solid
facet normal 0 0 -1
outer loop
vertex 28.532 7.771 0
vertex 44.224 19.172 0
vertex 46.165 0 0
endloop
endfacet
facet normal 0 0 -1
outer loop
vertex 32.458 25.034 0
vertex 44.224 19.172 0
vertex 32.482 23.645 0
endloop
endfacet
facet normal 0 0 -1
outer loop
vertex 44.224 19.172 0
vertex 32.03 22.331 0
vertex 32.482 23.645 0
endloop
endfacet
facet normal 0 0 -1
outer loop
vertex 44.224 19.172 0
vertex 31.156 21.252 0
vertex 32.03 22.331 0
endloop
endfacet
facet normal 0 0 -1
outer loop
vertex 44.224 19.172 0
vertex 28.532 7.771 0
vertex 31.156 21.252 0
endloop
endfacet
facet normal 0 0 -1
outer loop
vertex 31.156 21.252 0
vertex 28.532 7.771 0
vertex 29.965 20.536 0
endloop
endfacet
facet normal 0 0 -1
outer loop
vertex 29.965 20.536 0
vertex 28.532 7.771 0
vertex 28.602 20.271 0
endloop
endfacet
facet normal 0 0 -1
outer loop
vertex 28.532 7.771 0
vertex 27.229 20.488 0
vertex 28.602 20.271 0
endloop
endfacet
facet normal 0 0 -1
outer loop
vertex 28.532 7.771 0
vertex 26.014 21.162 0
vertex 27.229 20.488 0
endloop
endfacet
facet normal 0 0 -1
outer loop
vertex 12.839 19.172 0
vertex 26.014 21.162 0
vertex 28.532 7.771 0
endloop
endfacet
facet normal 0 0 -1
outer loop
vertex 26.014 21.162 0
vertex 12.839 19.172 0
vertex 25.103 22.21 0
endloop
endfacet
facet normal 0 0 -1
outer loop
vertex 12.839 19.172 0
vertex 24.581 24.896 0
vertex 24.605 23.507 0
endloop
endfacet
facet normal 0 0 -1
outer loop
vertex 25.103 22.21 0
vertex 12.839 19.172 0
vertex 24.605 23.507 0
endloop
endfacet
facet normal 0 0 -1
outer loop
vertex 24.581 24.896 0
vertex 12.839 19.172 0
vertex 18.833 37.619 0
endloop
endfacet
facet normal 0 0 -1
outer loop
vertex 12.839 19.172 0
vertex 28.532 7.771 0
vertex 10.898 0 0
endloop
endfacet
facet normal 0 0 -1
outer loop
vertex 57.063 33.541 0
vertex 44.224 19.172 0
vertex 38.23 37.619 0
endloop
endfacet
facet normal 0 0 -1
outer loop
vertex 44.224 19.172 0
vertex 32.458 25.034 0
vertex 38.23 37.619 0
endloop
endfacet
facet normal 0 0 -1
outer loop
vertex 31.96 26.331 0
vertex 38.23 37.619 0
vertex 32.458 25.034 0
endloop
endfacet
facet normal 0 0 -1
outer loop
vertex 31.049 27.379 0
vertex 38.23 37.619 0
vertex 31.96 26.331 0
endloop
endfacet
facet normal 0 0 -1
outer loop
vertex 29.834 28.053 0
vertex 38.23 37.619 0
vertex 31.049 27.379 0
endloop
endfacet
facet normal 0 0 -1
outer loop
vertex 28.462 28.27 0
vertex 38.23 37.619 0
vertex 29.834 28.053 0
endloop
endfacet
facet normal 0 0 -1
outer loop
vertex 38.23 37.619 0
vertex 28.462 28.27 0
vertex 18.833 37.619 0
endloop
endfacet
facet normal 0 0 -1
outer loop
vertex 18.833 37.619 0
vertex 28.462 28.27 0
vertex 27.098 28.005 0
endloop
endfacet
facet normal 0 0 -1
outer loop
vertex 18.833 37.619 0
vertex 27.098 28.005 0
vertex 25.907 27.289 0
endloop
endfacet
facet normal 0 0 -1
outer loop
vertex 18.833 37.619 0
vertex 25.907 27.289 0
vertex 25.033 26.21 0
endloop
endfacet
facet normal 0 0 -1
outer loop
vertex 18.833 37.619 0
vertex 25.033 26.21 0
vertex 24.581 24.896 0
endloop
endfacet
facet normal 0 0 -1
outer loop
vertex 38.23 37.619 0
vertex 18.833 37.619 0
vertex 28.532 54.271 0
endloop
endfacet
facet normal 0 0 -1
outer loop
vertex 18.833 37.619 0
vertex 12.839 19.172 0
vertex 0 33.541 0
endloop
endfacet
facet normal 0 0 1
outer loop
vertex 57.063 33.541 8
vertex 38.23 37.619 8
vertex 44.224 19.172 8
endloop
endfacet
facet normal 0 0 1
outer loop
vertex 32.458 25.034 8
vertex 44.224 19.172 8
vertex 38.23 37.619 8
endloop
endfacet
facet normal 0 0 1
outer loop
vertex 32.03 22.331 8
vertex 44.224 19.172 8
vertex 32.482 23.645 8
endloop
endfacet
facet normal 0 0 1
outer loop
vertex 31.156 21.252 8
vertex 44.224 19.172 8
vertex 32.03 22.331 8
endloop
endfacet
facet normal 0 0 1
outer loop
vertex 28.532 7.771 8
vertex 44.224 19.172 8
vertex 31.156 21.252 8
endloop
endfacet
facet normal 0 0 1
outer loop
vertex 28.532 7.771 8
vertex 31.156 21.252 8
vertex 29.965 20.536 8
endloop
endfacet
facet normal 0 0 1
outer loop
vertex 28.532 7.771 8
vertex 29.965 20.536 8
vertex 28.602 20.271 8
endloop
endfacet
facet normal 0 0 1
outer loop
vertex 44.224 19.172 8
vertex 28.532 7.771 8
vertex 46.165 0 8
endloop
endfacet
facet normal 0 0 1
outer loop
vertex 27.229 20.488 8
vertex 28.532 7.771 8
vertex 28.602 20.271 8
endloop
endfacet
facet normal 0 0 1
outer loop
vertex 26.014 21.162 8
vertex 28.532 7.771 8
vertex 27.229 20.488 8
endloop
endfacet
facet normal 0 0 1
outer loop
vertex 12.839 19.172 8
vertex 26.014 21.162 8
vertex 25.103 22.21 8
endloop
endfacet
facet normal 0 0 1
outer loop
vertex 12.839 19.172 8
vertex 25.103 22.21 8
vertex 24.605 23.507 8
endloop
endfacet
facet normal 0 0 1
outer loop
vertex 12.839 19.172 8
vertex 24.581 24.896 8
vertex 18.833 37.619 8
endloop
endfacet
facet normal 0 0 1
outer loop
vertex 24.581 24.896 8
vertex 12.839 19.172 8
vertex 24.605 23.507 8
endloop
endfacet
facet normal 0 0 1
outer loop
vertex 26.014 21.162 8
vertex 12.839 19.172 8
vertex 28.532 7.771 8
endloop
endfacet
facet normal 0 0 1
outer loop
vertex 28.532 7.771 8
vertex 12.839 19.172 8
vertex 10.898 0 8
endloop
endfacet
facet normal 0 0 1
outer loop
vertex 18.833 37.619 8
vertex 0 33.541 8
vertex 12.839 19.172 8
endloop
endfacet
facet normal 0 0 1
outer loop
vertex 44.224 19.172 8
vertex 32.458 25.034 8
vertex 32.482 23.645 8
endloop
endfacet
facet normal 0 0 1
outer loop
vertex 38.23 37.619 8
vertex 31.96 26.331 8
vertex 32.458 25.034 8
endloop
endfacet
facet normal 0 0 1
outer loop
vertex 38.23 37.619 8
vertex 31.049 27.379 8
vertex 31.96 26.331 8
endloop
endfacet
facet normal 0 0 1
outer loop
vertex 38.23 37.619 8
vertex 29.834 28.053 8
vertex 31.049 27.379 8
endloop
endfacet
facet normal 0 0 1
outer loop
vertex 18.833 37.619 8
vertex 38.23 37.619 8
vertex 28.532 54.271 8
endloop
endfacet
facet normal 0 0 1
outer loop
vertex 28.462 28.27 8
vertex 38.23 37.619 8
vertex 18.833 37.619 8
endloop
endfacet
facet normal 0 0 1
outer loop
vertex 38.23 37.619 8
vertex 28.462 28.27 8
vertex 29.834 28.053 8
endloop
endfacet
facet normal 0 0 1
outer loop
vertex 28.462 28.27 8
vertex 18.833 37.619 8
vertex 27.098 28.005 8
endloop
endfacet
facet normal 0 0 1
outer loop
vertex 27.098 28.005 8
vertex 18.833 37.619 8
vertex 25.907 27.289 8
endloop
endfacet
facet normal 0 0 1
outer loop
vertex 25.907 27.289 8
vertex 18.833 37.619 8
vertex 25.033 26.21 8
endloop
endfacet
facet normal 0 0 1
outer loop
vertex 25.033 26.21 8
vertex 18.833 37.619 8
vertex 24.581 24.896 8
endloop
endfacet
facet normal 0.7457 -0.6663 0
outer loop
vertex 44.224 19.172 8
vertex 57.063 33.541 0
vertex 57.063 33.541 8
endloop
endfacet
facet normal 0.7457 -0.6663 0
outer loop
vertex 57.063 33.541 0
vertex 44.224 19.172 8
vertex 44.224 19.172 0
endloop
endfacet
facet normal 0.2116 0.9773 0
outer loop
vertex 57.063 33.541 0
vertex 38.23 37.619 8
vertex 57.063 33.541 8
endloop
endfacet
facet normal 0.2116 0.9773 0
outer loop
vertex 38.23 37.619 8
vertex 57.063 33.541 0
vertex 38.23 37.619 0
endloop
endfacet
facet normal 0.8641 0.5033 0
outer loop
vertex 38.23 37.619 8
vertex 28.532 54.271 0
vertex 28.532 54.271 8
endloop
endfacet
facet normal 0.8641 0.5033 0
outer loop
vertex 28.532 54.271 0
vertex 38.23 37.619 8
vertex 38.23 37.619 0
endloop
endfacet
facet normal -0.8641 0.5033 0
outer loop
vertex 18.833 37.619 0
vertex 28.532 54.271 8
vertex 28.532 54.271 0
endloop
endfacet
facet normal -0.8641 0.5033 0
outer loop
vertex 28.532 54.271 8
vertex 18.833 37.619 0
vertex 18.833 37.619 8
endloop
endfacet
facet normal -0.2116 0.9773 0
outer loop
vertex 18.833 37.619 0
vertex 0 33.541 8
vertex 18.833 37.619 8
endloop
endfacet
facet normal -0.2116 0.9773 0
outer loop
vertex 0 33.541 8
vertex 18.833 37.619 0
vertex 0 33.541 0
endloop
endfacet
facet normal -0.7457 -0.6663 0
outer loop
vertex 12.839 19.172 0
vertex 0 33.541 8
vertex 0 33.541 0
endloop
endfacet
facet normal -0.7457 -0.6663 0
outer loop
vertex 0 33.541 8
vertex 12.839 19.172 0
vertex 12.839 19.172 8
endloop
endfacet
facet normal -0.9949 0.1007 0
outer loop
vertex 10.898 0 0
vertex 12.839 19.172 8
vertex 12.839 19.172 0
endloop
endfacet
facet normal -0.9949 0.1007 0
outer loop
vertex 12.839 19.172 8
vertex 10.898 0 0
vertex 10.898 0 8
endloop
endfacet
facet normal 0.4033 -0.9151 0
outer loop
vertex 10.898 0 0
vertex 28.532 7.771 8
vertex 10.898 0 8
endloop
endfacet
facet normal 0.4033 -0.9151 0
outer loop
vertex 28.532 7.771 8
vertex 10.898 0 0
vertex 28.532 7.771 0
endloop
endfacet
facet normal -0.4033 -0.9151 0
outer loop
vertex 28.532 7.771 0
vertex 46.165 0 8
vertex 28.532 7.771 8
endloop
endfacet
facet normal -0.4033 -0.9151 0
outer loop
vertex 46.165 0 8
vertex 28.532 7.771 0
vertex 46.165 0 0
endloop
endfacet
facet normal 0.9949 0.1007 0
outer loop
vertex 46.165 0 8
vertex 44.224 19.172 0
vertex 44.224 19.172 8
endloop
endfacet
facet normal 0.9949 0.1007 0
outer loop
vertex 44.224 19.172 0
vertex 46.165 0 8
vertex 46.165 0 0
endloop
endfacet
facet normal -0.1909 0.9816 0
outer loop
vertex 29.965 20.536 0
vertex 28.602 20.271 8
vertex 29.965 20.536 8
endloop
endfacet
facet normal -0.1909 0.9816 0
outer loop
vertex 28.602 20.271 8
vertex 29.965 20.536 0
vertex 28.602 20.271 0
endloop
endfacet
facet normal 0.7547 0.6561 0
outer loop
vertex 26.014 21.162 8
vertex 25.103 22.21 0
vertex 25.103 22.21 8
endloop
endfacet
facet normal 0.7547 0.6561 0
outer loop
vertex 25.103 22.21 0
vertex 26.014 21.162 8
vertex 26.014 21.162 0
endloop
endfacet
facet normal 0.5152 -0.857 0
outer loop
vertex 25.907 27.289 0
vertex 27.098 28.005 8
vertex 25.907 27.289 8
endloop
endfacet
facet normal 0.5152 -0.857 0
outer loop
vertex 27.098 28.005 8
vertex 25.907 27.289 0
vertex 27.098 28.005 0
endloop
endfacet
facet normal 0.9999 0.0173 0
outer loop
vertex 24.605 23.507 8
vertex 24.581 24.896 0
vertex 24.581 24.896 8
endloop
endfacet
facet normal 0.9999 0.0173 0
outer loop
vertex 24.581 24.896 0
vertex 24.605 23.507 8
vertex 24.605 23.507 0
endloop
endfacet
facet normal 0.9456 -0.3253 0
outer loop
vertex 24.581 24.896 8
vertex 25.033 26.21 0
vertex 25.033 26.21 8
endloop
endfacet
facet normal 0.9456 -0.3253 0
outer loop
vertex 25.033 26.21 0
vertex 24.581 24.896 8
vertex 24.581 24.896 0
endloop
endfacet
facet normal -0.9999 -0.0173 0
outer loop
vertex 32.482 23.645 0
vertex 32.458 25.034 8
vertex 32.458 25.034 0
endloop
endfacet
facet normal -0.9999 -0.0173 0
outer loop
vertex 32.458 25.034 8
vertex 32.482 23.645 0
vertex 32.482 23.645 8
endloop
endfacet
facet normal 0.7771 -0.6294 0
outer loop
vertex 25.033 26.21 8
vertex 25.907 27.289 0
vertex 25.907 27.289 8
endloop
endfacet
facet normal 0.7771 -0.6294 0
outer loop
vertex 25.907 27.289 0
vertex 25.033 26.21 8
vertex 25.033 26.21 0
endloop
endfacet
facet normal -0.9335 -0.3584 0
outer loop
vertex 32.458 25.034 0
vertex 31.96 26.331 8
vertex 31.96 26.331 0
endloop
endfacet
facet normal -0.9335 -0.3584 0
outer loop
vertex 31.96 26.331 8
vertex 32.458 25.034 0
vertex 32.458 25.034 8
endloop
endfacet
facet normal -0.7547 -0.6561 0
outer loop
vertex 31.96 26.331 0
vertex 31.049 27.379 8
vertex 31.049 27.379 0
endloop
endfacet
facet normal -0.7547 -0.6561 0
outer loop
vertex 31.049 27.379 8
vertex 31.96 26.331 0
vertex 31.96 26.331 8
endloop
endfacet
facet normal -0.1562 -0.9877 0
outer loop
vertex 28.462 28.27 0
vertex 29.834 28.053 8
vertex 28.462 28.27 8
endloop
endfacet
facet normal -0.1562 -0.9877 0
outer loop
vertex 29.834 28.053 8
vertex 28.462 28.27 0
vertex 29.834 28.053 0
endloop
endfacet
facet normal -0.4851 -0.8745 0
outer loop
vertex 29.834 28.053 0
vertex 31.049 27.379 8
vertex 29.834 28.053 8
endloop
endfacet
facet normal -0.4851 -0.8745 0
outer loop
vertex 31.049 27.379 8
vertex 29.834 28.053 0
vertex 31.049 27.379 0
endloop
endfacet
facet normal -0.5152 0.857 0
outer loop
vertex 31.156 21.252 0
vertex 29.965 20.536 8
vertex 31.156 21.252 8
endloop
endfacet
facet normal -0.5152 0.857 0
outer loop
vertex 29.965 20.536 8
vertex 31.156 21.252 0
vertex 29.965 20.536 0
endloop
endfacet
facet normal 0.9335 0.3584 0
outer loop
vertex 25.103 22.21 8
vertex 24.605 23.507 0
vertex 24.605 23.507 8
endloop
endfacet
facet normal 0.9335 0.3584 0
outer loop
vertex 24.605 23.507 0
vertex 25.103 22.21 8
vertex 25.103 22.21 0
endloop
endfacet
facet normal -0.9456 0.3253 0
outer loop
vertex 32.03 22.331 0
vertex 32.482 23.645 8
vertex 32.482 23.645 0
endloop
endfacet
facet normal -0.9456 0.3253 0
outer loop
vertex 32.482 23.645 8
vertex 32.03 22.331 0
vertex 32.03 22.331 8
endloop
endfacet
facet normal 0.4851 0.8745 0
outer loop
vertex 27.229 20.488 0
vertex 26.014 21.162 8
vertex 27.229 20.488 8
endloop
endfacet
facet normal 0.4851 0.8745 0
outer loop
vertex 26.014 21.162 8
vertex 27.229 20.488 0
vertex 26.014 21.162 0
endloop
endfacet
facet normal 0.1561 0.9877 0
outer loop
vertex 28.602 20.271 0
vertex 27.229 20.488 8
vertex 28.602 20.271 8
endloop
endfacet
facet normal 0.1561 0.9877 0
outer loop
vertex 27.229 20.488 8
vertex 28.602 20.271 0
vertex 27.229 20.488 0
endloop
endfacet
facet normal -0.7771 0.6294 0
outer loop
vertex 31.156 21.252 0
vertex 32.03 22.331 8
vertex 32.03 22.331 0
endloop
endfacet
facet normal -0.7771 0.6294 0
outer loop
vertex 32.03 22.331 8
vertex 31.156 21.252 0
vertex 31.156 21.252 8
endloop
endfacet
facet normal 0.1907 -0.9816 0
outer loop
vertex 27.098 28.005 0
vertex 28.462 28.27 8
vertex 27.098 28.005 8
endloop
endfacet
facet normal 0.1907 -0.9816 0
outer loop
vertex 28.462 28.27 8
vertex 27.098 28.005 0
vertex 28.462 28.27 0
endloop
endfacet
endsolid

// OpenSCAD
$fn = 32;

// ----------------------------------------------------------------------
// Star wheel: 5-point star, R30
// ----------------------------------------------------------------------

// --- parameters (mm) ---
n_points = 5;             // number of points / teeth
r_out = 30;               // tip radius
r_in = 16.5;              // root radius
bore_r = 4;               // centre bore radius
plate_t = 8;              // plate thickness, Z (extrusion height)
bore_d = 8;               // centre bore diameter

profile = [[28.532, 54.271], [18.833, 37.619], [0, 33.541], [12.839, 19.172], [10.898, 0], [28.532, 7.771], [46.165, 0], [44.224, 19.172], [57.063, 33.541], [38.23, 37.619]];  // primary outline, 10 points, counter clockwise
void_1 = [[32.458, 25.034], [31.96, 26.331], [31.049, 27.379], [29.834, 28.053], [28.462, 28.27], [27.098, 28.005], [25.907, 27.289], [25.033, 26.21], [24.581, 24.896], [24.605, 23.507], [25.103, 22.21], [26.014, 21.162], [27.229, 20.488], [28.602, 20.271], [29.965, 20.536], [31.156, 21.252], [32.03, 22.331], [32.482, 23.645]];  // centre bore, 18 points

// --- the one profile operation ---
difference() {
  linear_extrude(height = plate_t) polygon(points = profile);
  translate([0, 0, -1])
    linear_extrude(height = plate_t + 2) polygon(points = void_1);
}
